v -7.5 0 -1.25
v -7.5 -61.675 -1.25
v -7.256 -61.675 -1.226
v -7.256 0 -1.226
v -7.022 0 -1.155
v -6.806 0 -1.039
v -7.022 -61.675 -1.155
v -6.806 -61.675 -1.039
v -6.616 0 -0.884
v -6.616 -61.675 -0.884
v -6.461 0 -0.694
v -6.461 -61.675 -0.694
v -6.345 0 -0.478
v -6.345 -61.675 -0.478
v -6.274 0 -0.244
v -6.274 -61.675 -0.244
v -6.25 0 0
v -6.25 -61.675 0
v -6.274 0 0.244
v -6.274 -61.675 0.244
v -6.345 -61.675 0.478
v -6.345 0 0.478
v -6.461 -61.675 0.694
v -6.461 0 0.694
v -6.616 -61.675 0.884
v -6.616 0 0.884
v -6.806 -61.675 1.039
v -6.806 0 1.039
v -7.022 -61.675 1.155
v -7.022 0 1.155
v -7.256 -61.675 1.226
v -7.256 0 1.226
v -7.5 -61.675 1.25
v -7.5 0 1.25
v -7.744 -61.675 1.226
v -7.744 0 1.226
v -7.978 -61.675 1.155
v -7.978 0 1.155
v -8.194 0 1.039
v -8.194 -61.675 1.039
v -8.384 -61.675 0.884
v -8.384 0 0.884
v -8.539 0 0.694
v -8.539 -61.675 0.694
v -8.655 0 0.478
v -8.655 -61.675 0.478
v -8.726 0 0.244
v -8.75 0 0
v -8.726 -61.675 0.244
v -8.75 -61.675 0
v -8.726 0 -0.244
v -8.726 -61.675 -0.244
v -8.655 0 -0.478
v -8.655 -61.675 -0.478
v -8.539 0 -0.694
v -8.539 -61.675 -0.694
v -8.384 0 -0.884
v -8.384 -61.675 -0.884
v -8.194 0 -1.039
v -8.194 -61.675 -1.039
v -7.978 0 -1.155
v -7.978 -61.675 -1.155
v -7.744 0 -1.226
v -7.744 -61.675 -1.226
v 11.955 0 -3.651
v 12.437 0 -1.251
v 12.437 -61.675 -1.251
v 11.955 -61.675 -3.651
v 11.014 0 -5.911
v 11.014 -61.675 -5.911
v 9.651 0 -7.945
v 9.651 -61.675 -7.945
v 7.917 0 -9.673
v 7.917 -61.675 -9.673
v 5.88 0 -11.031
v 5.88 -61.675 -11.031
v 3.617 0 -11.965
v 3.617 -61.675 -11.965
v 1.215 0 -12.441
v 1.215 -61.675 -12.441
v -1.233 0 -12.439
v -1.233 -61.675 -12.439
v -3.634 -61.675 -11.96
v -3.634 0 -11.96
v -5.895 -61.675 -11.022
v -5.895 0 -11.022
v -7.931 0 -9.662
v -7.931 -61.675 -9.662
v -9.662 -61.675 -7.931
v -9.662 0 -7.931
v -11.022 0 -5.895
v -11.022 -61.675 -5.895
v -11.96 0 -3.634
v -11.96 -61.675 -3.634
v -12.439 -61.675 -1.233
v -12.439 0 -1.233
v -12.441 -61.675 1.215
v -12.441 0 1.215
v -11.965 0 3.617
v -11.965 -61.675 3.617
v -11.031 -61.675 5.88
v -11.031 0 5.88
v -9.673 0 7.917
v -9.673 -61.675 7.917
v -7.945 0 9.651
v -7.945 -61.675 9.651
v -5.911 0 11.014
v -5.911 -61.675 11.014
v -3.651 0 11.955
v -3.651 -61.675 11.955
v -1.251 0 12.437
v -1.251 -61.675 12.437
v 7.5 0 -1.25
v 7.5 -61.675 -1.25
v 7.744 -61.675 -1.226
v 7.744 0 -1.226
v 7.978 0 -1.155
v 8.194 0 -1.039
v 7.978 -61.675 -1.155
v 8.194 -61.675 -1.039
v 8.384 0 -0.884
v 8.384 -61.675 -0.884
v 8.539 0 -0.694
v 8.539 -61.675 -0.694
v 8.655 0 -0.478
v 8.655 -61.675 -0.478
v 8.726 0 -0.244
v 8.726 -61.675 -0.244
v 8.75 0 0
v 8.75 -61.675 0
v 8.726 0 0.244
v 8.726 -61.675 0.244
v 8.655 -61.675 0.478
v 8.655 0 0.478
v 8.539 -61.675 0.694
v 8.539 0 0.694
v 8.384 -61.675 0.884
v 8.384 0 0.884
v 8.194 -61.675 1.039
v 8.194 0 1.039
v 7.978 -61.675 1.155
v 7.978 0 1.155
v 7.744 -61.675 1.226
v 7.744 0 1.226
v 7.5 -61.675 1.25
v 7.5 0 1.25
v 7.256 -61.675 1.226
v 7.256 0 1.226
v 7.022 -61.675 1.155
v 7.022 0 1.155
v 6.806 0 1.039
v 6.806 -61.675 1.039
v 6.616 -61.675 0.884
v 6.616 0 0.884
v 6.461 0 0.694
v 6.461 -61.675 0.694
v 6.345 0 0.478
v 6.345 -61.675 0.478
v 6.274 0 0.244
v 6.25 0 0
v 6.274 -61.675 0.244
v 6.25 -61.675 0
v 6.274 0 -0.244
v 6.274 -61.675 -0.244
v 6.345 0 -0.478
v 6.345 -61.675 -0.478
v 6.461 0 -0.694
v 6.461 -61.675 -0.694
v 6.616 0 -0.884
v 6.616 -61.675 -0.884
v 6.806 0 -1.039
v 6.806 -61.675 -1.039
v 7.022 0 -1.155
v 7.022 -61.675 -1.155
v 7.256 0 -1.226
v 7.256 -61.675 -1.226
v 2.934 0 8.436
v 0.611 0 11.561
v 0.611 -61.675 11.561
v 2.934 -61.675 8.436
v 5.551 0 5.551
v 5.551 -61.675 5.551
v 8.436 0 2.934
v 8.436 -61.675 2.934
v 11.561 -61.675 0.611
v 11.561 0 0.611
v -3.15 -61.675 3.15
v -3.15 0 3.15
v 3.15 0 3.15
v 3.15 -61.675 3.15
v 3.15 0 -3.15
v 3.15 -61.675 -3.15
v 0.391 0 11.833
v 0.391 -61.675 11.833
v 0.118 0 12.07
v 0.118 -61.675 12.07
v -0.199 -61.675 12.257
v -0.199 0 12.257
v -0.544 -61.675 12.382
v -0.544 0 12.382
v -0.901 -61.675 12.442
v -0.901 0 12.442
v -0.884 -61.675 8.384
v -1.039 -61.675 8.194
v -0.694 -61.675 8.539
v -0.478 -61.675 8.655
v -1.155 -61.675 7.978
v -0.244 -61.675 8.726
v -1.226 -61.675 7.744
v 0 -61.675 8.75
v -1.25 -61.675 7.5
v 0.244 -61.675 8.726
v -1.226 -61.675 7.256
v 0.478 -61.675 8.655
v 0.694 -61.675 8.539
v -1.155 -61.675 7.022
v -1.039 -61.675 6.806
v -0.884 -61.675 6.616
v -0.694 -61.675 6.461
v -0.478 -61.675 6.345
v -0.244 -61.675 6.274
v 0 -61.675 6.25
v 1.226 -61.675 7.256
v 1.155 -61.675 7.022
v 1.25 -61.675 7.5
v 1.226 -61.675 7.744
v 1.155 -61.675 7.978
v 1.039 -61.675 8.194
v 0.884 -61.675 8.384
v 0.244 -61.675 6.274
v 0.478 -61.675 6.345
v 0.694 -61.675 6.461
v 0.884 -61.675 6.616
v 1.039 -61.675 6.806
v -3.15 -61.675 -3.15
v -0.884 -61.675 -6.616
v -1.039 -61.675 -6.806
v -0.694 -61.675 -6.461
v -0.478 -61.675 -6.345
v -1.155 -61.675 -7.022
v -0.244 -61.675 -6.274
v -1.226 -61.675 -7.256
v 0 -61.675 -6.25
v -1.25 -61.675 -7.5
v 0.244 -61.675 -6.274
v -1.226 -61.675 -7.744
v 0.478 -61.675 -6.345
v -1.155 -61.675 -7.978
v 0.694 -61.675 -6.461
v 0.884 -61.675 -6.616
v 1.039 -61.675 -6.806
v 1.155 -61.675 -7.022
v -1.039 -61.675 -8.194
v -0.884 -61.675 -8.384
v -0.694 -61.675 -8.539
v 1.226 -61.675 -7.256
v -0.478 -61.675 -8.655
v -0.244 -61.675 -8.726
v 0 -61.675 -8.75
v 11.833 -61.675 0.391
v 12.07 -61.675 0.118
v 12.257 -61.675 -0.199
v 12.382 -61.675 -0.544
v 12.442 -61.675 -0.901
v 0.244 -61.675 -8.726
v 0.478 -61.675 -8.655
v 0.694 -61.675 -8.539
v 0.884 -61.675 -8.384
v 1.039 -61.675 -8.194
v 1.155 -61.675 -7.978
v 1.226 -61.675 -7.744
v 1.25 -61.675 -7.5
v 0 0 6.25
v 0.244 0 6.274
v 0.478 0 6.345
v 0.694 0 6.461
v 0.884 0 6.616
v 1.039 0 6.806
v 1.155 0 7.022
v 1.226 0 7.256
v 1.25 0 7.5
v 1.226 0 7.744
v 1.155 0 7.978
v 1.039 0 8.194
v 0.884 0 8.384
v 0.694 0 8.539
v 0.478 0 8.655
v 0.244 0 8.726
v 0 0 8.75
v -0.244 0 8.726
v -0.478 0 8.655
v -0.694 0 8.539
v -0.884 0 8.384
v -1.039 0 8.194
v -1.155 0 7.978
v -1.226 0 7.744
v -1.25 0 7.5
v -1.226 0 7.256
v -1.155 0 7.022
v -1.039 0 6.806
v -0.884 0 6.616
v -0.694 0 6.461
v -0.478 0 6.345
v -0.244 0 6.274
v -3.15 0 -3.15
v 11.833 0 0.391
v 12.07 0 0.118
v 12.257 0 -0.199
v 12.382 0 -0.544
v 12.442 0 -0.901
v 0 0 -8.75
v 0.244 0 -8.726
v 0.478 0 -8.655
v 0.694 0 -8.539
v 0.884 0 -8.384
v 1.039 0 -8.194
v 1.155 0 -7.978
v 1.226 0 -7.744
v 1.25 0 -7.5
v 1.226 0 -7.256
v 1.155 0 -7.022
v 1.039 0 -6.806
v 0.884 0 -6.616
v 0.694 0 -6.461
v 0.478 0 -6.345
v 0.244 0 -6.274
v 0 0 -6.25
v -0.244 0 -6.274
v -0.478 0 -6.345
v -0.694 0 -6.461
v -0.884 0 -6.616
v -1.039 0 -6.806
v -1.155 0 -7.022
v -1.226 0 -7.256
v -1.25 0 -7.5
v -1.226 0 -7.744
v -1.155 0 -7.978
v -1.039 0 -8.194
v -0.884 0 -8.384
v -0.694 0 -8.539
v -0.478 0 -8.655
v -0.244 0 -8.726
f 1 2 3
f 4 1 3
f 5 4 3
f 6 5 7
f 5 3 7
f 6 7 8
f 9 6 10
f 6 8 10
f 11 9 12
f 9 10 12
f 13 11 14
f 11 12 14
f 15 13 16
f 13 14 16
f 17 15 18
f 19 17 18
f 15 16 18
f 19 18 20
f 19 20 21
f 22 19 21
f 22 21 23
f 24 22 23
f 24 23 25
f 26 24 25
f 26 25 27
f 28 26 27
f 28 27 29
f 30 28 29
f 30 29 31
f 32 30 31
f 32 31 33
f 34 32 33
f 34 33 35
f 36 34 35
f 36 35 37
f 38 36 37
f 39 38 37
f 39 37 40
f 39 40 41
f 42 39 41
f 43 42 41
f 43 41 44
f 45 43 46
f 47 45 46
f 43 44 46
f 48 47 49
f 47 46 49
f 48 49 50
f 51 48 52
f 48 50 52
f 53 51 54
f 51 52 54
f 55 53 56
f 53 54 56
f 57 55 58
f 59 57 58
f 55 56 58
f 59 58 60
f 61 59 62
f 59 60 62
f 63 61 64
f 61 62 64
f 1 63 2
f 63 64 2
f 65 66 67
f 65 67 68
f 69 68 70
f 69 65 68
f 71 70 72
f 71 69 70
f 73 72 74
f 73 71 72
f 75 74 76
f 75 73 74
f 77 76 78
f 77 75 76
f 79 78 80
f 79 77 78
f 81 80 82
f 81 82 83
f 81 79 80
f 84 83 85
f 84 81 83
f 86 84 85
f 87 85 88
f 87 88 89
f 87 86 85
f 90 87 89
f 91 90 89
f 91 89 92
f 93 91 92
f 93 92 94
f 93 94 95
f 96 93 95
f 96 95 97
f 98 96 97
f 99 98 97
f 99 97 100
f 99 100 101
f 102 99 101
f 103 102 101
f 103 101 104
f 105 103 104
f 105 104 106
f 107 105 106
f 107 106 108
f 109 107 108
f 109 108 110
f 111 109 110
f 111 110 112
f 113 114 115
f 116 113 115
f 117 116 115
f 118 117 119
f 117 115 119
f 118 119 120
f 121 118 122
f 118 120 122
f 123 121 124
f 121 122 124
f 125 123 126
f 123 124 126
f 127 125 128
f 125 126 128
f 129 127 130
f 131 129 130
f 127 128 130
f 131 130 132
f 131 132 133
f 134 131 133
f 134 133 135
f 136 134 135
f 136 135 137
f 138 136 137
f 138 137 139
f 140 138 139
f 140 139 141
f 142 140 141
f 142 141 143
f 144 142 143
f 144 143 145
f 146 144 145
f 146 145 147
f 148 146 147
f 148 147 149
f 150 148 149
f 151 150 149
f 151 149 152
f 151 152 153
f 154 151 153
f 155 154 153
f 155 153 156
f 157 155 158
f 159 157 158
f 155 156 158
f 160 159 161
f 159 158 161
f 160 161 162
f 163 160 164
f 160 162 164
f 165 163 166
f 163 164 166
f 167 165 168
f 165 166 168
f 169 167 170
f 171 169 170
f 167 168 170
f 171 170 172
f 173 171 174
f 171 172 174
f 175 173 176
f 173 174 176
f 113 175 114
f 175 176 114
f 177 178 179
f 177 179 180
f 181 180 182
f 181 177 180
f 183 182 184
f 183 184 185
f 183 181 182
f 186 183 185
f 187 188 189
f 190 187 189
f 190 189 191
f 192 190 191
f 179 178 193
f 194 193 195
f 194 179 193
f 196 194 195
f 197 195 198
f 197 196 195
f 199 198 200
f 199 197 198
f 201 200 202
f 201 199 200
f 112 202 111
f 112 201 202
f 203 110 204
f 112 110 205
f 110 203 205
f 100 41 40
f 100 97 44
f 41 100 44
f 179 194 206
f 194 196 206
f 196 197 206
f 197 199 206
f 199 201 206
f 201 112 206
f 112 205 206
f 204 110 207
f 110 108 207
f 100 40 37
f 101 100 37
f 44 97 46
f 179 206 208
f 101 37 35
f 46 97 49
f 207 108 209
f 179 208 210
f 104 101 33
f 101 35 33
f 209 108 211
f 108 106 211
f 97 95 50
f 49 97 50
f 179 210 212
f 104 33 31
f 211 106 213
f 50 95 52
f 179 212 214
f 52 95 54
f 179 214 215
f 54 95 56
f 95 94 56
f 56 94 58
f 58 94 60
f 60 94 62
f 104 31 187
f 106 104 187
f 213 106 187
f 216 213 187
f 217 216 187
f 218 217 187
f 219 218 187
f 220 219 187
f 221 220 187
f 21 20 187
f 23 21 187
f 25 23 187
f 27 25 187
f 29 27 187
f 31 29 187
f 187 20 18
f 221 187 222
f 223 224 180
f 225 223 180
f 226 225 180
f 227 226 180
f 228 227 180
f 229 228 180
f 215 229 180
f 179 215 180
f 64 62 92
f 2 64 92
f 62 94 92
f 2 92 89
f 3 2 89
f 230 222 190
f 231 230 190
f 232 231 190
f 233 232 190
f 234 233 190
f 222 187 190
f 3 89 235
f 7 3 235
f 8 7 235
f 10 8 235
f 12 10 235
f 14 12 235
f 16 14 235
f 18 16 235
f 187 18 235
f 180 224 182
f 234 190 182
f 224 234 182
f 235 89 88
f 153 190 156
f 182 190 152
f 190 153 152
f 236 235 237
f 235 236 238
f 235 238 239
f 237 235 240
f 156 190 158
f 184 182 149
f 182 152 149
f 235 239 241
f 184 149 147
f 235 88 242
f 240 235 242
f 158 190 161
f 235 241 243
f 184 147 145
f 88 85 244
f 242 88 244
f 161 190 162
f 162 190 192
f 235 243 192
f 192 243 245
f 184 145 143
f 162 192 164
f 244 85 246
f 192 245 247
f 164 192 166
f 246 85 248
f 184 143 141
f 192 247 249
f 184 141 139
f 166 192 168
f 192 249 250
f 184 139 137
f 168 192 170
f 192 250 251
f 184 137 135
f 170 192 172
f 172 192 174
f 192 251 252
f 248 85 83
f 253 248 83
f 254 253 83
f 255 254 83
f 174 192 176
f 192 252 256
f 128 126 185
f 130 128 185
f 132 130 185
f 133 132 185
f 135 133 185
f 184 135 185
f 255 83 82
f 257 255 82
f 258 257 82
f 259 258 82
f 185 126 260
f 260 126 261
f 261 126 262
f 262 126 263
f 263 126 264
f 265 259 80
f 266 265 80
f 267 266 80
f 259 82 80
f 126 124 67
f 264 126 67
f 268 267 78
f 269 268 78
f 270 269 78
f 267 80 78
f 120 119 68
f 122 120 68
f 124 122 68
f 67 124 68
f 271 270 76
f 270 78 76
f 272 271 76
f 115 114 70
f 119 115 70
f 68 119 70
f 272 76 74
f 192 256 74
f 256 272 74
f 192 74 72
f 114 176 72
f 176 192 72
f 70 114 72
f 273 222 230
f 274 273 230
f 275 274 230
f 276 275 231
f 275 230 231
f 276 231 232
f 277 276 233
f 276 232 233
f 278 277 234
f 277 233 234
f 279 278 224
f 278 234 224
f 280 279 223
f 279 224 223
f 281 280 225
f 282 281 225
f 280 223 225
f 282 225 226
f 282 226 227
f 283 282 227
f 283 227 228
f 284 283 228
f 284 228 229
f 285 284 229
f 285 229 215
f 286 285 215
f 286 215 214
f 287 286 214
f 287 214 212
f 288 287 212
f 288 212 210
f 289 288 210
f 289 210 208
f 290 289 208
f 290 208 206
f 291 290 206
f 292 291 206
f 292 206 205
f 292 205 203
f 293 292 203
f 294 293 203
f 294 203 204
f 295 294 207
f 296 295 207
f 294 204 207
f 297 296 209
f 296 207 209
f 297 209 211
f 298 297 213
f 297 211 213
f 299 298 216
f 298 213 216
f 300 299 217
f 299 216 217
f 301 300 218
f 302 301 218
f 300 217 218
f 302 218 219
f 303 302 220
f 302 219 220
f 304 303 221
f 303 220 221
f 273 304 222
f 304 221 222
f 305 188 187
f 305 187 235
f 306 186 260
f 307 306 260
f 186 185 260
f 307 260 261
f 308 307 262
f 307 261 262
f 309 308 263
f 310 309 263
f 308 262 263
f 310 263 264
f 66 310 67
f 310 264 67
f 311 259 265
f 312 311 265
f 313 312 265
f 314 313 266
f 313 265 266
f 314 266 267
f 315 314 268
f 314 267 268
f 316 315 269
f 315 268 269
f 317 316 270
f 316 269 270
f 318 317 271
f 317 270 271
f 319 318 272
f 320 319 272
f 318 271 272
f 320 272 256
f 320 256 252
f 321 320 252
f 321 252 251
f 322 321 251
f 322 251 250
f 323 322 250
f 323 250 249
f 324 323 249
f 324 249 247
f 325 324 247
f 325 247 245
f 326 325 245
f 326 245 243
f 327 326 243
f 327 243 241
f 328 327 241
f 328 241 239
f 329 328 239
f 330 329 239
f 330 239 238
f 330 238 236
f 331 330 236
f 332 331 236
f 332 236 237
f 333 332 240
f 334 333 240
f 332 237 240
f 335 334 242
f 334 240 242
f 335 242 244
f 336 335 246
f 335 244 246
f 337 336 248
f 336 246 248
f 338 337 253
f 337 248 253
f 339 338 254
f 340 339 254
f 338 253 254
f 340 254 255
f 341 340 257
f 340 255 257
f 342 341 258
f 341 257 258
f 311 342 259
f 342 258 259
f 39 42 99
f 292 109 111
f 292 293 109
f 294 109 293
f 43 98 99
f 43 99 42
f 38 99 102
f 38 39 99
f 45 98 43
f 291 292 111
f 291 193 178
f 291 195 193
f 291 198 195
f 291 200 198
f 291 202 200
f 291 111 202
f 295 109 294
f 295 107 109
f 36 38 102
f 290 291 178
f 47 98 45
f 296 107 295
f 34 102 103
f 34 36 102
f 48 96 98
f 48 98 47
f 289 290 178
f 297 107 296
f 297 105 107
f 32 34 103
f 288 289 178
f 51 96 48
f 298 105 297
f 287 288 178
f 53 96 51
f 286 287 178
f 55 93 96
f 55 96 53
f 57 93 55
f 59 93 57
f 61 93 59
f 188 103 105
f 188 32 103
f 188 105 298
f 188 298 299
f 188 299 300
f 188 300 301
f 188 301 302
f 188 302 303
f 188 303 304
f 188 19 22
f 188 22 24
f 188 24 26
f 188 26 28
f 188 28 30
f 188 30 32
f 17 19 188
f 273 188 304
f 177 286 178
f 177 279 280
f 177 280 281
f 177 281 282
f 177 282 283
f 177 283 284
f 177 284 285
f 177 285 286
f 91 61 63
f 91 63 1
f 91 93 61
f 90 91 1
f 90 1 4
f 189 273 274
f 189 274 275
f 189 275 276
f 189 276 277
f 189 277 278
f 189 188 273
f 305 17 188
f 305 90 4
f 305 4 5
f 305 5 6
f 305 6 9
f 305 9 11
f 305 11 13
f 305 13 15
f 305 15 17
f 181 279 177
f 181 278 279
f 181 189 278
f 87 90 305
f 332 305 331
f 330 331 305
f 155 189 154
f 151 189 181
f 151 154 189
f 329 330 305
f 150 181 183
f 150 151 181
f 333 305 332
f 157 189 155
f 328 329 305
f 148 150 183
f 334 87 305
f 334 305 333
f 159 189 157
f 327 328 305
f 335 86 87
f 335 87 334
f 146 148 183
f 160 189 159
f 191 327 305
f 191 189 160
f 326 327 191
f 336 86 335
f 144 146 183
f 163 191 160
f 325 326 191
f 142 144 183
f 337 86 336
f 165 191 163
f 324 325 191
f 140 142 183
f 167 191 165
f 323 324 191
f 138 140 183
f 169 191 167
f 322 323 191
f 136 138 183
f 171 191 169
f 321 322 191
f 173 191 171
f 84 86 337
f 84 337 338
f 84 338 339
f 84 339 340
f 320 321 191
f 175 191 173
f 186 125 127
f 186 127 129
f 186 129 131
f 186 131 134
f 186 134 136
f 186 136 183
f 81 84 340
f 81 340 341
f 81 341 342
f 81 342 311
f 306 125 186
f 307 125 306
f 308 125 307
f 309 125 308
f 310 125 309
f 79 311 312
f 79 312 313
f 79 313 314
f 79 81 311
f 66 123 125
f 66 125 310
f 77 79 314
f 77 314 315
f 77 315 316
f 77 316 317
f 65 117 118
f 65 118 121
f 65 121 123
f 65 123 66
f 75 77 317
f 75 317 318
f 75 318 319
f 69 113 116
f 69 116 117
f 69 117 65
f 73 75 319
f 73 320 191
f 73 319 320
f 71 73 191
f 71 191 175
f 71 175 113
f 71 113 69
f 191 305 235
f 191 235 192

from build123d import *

# Parameters (mm, degrees)
SKETCH1_W                   = 6.3
SKETCH1_H                   = 6.3
BOSS_EXTRUDE1_DEPTH         = 61.675
TAP_DRILL_FOR_M3X0_5_TAP1_D = 2.5
FILLET1_R                   = 2


with BuildPart() as part:
    # Sketch1 → Boss-Extrude1 (new body)
    with BuildSketch(Plane(origin=(0, 0, 0), x_dir=(1, 0, 0), z_dir=(0, 1, 0))):
        with BuildLine():
            ThreePointArc((0, -12.5), (5.550824366, -5.550824366), (12.5, 0))
            ThreePointArc((12.5, 0), (-8.838834765, 8.838834765), (0, -12.5))
        make_face()
        Rectangle(SKETCH1_W, SKETCH1_H, mode=Mode.SUBTRACT)
    extrude(amount=-BOSS_EXTRUDE1_DEPTH)

    # Tap Drill for M3x0.5 Tap1 (through all)
    with Locations(Plane(origin=(0, 0, -7.5), x_dir=(0, 0, 1), z_dir=(0, 1, 0))):
        with Locations((0, 0), (7.5, 7.5), (7.5, -7.5), (15, 0)):
            Hole(TAP_DRILL_FOR_M3X0_5_TAP1_D / 2)

    # Fillet1
    fillet1_edges = [part.edges().sort_by_distance(p)[0] for p in [
        (0, -30.8375, 12.5),
        (12.5, -30.8375, 0),
    ]]
    fillet(fillet1_edges, radius=FILLET1_R)


solid = part.part
